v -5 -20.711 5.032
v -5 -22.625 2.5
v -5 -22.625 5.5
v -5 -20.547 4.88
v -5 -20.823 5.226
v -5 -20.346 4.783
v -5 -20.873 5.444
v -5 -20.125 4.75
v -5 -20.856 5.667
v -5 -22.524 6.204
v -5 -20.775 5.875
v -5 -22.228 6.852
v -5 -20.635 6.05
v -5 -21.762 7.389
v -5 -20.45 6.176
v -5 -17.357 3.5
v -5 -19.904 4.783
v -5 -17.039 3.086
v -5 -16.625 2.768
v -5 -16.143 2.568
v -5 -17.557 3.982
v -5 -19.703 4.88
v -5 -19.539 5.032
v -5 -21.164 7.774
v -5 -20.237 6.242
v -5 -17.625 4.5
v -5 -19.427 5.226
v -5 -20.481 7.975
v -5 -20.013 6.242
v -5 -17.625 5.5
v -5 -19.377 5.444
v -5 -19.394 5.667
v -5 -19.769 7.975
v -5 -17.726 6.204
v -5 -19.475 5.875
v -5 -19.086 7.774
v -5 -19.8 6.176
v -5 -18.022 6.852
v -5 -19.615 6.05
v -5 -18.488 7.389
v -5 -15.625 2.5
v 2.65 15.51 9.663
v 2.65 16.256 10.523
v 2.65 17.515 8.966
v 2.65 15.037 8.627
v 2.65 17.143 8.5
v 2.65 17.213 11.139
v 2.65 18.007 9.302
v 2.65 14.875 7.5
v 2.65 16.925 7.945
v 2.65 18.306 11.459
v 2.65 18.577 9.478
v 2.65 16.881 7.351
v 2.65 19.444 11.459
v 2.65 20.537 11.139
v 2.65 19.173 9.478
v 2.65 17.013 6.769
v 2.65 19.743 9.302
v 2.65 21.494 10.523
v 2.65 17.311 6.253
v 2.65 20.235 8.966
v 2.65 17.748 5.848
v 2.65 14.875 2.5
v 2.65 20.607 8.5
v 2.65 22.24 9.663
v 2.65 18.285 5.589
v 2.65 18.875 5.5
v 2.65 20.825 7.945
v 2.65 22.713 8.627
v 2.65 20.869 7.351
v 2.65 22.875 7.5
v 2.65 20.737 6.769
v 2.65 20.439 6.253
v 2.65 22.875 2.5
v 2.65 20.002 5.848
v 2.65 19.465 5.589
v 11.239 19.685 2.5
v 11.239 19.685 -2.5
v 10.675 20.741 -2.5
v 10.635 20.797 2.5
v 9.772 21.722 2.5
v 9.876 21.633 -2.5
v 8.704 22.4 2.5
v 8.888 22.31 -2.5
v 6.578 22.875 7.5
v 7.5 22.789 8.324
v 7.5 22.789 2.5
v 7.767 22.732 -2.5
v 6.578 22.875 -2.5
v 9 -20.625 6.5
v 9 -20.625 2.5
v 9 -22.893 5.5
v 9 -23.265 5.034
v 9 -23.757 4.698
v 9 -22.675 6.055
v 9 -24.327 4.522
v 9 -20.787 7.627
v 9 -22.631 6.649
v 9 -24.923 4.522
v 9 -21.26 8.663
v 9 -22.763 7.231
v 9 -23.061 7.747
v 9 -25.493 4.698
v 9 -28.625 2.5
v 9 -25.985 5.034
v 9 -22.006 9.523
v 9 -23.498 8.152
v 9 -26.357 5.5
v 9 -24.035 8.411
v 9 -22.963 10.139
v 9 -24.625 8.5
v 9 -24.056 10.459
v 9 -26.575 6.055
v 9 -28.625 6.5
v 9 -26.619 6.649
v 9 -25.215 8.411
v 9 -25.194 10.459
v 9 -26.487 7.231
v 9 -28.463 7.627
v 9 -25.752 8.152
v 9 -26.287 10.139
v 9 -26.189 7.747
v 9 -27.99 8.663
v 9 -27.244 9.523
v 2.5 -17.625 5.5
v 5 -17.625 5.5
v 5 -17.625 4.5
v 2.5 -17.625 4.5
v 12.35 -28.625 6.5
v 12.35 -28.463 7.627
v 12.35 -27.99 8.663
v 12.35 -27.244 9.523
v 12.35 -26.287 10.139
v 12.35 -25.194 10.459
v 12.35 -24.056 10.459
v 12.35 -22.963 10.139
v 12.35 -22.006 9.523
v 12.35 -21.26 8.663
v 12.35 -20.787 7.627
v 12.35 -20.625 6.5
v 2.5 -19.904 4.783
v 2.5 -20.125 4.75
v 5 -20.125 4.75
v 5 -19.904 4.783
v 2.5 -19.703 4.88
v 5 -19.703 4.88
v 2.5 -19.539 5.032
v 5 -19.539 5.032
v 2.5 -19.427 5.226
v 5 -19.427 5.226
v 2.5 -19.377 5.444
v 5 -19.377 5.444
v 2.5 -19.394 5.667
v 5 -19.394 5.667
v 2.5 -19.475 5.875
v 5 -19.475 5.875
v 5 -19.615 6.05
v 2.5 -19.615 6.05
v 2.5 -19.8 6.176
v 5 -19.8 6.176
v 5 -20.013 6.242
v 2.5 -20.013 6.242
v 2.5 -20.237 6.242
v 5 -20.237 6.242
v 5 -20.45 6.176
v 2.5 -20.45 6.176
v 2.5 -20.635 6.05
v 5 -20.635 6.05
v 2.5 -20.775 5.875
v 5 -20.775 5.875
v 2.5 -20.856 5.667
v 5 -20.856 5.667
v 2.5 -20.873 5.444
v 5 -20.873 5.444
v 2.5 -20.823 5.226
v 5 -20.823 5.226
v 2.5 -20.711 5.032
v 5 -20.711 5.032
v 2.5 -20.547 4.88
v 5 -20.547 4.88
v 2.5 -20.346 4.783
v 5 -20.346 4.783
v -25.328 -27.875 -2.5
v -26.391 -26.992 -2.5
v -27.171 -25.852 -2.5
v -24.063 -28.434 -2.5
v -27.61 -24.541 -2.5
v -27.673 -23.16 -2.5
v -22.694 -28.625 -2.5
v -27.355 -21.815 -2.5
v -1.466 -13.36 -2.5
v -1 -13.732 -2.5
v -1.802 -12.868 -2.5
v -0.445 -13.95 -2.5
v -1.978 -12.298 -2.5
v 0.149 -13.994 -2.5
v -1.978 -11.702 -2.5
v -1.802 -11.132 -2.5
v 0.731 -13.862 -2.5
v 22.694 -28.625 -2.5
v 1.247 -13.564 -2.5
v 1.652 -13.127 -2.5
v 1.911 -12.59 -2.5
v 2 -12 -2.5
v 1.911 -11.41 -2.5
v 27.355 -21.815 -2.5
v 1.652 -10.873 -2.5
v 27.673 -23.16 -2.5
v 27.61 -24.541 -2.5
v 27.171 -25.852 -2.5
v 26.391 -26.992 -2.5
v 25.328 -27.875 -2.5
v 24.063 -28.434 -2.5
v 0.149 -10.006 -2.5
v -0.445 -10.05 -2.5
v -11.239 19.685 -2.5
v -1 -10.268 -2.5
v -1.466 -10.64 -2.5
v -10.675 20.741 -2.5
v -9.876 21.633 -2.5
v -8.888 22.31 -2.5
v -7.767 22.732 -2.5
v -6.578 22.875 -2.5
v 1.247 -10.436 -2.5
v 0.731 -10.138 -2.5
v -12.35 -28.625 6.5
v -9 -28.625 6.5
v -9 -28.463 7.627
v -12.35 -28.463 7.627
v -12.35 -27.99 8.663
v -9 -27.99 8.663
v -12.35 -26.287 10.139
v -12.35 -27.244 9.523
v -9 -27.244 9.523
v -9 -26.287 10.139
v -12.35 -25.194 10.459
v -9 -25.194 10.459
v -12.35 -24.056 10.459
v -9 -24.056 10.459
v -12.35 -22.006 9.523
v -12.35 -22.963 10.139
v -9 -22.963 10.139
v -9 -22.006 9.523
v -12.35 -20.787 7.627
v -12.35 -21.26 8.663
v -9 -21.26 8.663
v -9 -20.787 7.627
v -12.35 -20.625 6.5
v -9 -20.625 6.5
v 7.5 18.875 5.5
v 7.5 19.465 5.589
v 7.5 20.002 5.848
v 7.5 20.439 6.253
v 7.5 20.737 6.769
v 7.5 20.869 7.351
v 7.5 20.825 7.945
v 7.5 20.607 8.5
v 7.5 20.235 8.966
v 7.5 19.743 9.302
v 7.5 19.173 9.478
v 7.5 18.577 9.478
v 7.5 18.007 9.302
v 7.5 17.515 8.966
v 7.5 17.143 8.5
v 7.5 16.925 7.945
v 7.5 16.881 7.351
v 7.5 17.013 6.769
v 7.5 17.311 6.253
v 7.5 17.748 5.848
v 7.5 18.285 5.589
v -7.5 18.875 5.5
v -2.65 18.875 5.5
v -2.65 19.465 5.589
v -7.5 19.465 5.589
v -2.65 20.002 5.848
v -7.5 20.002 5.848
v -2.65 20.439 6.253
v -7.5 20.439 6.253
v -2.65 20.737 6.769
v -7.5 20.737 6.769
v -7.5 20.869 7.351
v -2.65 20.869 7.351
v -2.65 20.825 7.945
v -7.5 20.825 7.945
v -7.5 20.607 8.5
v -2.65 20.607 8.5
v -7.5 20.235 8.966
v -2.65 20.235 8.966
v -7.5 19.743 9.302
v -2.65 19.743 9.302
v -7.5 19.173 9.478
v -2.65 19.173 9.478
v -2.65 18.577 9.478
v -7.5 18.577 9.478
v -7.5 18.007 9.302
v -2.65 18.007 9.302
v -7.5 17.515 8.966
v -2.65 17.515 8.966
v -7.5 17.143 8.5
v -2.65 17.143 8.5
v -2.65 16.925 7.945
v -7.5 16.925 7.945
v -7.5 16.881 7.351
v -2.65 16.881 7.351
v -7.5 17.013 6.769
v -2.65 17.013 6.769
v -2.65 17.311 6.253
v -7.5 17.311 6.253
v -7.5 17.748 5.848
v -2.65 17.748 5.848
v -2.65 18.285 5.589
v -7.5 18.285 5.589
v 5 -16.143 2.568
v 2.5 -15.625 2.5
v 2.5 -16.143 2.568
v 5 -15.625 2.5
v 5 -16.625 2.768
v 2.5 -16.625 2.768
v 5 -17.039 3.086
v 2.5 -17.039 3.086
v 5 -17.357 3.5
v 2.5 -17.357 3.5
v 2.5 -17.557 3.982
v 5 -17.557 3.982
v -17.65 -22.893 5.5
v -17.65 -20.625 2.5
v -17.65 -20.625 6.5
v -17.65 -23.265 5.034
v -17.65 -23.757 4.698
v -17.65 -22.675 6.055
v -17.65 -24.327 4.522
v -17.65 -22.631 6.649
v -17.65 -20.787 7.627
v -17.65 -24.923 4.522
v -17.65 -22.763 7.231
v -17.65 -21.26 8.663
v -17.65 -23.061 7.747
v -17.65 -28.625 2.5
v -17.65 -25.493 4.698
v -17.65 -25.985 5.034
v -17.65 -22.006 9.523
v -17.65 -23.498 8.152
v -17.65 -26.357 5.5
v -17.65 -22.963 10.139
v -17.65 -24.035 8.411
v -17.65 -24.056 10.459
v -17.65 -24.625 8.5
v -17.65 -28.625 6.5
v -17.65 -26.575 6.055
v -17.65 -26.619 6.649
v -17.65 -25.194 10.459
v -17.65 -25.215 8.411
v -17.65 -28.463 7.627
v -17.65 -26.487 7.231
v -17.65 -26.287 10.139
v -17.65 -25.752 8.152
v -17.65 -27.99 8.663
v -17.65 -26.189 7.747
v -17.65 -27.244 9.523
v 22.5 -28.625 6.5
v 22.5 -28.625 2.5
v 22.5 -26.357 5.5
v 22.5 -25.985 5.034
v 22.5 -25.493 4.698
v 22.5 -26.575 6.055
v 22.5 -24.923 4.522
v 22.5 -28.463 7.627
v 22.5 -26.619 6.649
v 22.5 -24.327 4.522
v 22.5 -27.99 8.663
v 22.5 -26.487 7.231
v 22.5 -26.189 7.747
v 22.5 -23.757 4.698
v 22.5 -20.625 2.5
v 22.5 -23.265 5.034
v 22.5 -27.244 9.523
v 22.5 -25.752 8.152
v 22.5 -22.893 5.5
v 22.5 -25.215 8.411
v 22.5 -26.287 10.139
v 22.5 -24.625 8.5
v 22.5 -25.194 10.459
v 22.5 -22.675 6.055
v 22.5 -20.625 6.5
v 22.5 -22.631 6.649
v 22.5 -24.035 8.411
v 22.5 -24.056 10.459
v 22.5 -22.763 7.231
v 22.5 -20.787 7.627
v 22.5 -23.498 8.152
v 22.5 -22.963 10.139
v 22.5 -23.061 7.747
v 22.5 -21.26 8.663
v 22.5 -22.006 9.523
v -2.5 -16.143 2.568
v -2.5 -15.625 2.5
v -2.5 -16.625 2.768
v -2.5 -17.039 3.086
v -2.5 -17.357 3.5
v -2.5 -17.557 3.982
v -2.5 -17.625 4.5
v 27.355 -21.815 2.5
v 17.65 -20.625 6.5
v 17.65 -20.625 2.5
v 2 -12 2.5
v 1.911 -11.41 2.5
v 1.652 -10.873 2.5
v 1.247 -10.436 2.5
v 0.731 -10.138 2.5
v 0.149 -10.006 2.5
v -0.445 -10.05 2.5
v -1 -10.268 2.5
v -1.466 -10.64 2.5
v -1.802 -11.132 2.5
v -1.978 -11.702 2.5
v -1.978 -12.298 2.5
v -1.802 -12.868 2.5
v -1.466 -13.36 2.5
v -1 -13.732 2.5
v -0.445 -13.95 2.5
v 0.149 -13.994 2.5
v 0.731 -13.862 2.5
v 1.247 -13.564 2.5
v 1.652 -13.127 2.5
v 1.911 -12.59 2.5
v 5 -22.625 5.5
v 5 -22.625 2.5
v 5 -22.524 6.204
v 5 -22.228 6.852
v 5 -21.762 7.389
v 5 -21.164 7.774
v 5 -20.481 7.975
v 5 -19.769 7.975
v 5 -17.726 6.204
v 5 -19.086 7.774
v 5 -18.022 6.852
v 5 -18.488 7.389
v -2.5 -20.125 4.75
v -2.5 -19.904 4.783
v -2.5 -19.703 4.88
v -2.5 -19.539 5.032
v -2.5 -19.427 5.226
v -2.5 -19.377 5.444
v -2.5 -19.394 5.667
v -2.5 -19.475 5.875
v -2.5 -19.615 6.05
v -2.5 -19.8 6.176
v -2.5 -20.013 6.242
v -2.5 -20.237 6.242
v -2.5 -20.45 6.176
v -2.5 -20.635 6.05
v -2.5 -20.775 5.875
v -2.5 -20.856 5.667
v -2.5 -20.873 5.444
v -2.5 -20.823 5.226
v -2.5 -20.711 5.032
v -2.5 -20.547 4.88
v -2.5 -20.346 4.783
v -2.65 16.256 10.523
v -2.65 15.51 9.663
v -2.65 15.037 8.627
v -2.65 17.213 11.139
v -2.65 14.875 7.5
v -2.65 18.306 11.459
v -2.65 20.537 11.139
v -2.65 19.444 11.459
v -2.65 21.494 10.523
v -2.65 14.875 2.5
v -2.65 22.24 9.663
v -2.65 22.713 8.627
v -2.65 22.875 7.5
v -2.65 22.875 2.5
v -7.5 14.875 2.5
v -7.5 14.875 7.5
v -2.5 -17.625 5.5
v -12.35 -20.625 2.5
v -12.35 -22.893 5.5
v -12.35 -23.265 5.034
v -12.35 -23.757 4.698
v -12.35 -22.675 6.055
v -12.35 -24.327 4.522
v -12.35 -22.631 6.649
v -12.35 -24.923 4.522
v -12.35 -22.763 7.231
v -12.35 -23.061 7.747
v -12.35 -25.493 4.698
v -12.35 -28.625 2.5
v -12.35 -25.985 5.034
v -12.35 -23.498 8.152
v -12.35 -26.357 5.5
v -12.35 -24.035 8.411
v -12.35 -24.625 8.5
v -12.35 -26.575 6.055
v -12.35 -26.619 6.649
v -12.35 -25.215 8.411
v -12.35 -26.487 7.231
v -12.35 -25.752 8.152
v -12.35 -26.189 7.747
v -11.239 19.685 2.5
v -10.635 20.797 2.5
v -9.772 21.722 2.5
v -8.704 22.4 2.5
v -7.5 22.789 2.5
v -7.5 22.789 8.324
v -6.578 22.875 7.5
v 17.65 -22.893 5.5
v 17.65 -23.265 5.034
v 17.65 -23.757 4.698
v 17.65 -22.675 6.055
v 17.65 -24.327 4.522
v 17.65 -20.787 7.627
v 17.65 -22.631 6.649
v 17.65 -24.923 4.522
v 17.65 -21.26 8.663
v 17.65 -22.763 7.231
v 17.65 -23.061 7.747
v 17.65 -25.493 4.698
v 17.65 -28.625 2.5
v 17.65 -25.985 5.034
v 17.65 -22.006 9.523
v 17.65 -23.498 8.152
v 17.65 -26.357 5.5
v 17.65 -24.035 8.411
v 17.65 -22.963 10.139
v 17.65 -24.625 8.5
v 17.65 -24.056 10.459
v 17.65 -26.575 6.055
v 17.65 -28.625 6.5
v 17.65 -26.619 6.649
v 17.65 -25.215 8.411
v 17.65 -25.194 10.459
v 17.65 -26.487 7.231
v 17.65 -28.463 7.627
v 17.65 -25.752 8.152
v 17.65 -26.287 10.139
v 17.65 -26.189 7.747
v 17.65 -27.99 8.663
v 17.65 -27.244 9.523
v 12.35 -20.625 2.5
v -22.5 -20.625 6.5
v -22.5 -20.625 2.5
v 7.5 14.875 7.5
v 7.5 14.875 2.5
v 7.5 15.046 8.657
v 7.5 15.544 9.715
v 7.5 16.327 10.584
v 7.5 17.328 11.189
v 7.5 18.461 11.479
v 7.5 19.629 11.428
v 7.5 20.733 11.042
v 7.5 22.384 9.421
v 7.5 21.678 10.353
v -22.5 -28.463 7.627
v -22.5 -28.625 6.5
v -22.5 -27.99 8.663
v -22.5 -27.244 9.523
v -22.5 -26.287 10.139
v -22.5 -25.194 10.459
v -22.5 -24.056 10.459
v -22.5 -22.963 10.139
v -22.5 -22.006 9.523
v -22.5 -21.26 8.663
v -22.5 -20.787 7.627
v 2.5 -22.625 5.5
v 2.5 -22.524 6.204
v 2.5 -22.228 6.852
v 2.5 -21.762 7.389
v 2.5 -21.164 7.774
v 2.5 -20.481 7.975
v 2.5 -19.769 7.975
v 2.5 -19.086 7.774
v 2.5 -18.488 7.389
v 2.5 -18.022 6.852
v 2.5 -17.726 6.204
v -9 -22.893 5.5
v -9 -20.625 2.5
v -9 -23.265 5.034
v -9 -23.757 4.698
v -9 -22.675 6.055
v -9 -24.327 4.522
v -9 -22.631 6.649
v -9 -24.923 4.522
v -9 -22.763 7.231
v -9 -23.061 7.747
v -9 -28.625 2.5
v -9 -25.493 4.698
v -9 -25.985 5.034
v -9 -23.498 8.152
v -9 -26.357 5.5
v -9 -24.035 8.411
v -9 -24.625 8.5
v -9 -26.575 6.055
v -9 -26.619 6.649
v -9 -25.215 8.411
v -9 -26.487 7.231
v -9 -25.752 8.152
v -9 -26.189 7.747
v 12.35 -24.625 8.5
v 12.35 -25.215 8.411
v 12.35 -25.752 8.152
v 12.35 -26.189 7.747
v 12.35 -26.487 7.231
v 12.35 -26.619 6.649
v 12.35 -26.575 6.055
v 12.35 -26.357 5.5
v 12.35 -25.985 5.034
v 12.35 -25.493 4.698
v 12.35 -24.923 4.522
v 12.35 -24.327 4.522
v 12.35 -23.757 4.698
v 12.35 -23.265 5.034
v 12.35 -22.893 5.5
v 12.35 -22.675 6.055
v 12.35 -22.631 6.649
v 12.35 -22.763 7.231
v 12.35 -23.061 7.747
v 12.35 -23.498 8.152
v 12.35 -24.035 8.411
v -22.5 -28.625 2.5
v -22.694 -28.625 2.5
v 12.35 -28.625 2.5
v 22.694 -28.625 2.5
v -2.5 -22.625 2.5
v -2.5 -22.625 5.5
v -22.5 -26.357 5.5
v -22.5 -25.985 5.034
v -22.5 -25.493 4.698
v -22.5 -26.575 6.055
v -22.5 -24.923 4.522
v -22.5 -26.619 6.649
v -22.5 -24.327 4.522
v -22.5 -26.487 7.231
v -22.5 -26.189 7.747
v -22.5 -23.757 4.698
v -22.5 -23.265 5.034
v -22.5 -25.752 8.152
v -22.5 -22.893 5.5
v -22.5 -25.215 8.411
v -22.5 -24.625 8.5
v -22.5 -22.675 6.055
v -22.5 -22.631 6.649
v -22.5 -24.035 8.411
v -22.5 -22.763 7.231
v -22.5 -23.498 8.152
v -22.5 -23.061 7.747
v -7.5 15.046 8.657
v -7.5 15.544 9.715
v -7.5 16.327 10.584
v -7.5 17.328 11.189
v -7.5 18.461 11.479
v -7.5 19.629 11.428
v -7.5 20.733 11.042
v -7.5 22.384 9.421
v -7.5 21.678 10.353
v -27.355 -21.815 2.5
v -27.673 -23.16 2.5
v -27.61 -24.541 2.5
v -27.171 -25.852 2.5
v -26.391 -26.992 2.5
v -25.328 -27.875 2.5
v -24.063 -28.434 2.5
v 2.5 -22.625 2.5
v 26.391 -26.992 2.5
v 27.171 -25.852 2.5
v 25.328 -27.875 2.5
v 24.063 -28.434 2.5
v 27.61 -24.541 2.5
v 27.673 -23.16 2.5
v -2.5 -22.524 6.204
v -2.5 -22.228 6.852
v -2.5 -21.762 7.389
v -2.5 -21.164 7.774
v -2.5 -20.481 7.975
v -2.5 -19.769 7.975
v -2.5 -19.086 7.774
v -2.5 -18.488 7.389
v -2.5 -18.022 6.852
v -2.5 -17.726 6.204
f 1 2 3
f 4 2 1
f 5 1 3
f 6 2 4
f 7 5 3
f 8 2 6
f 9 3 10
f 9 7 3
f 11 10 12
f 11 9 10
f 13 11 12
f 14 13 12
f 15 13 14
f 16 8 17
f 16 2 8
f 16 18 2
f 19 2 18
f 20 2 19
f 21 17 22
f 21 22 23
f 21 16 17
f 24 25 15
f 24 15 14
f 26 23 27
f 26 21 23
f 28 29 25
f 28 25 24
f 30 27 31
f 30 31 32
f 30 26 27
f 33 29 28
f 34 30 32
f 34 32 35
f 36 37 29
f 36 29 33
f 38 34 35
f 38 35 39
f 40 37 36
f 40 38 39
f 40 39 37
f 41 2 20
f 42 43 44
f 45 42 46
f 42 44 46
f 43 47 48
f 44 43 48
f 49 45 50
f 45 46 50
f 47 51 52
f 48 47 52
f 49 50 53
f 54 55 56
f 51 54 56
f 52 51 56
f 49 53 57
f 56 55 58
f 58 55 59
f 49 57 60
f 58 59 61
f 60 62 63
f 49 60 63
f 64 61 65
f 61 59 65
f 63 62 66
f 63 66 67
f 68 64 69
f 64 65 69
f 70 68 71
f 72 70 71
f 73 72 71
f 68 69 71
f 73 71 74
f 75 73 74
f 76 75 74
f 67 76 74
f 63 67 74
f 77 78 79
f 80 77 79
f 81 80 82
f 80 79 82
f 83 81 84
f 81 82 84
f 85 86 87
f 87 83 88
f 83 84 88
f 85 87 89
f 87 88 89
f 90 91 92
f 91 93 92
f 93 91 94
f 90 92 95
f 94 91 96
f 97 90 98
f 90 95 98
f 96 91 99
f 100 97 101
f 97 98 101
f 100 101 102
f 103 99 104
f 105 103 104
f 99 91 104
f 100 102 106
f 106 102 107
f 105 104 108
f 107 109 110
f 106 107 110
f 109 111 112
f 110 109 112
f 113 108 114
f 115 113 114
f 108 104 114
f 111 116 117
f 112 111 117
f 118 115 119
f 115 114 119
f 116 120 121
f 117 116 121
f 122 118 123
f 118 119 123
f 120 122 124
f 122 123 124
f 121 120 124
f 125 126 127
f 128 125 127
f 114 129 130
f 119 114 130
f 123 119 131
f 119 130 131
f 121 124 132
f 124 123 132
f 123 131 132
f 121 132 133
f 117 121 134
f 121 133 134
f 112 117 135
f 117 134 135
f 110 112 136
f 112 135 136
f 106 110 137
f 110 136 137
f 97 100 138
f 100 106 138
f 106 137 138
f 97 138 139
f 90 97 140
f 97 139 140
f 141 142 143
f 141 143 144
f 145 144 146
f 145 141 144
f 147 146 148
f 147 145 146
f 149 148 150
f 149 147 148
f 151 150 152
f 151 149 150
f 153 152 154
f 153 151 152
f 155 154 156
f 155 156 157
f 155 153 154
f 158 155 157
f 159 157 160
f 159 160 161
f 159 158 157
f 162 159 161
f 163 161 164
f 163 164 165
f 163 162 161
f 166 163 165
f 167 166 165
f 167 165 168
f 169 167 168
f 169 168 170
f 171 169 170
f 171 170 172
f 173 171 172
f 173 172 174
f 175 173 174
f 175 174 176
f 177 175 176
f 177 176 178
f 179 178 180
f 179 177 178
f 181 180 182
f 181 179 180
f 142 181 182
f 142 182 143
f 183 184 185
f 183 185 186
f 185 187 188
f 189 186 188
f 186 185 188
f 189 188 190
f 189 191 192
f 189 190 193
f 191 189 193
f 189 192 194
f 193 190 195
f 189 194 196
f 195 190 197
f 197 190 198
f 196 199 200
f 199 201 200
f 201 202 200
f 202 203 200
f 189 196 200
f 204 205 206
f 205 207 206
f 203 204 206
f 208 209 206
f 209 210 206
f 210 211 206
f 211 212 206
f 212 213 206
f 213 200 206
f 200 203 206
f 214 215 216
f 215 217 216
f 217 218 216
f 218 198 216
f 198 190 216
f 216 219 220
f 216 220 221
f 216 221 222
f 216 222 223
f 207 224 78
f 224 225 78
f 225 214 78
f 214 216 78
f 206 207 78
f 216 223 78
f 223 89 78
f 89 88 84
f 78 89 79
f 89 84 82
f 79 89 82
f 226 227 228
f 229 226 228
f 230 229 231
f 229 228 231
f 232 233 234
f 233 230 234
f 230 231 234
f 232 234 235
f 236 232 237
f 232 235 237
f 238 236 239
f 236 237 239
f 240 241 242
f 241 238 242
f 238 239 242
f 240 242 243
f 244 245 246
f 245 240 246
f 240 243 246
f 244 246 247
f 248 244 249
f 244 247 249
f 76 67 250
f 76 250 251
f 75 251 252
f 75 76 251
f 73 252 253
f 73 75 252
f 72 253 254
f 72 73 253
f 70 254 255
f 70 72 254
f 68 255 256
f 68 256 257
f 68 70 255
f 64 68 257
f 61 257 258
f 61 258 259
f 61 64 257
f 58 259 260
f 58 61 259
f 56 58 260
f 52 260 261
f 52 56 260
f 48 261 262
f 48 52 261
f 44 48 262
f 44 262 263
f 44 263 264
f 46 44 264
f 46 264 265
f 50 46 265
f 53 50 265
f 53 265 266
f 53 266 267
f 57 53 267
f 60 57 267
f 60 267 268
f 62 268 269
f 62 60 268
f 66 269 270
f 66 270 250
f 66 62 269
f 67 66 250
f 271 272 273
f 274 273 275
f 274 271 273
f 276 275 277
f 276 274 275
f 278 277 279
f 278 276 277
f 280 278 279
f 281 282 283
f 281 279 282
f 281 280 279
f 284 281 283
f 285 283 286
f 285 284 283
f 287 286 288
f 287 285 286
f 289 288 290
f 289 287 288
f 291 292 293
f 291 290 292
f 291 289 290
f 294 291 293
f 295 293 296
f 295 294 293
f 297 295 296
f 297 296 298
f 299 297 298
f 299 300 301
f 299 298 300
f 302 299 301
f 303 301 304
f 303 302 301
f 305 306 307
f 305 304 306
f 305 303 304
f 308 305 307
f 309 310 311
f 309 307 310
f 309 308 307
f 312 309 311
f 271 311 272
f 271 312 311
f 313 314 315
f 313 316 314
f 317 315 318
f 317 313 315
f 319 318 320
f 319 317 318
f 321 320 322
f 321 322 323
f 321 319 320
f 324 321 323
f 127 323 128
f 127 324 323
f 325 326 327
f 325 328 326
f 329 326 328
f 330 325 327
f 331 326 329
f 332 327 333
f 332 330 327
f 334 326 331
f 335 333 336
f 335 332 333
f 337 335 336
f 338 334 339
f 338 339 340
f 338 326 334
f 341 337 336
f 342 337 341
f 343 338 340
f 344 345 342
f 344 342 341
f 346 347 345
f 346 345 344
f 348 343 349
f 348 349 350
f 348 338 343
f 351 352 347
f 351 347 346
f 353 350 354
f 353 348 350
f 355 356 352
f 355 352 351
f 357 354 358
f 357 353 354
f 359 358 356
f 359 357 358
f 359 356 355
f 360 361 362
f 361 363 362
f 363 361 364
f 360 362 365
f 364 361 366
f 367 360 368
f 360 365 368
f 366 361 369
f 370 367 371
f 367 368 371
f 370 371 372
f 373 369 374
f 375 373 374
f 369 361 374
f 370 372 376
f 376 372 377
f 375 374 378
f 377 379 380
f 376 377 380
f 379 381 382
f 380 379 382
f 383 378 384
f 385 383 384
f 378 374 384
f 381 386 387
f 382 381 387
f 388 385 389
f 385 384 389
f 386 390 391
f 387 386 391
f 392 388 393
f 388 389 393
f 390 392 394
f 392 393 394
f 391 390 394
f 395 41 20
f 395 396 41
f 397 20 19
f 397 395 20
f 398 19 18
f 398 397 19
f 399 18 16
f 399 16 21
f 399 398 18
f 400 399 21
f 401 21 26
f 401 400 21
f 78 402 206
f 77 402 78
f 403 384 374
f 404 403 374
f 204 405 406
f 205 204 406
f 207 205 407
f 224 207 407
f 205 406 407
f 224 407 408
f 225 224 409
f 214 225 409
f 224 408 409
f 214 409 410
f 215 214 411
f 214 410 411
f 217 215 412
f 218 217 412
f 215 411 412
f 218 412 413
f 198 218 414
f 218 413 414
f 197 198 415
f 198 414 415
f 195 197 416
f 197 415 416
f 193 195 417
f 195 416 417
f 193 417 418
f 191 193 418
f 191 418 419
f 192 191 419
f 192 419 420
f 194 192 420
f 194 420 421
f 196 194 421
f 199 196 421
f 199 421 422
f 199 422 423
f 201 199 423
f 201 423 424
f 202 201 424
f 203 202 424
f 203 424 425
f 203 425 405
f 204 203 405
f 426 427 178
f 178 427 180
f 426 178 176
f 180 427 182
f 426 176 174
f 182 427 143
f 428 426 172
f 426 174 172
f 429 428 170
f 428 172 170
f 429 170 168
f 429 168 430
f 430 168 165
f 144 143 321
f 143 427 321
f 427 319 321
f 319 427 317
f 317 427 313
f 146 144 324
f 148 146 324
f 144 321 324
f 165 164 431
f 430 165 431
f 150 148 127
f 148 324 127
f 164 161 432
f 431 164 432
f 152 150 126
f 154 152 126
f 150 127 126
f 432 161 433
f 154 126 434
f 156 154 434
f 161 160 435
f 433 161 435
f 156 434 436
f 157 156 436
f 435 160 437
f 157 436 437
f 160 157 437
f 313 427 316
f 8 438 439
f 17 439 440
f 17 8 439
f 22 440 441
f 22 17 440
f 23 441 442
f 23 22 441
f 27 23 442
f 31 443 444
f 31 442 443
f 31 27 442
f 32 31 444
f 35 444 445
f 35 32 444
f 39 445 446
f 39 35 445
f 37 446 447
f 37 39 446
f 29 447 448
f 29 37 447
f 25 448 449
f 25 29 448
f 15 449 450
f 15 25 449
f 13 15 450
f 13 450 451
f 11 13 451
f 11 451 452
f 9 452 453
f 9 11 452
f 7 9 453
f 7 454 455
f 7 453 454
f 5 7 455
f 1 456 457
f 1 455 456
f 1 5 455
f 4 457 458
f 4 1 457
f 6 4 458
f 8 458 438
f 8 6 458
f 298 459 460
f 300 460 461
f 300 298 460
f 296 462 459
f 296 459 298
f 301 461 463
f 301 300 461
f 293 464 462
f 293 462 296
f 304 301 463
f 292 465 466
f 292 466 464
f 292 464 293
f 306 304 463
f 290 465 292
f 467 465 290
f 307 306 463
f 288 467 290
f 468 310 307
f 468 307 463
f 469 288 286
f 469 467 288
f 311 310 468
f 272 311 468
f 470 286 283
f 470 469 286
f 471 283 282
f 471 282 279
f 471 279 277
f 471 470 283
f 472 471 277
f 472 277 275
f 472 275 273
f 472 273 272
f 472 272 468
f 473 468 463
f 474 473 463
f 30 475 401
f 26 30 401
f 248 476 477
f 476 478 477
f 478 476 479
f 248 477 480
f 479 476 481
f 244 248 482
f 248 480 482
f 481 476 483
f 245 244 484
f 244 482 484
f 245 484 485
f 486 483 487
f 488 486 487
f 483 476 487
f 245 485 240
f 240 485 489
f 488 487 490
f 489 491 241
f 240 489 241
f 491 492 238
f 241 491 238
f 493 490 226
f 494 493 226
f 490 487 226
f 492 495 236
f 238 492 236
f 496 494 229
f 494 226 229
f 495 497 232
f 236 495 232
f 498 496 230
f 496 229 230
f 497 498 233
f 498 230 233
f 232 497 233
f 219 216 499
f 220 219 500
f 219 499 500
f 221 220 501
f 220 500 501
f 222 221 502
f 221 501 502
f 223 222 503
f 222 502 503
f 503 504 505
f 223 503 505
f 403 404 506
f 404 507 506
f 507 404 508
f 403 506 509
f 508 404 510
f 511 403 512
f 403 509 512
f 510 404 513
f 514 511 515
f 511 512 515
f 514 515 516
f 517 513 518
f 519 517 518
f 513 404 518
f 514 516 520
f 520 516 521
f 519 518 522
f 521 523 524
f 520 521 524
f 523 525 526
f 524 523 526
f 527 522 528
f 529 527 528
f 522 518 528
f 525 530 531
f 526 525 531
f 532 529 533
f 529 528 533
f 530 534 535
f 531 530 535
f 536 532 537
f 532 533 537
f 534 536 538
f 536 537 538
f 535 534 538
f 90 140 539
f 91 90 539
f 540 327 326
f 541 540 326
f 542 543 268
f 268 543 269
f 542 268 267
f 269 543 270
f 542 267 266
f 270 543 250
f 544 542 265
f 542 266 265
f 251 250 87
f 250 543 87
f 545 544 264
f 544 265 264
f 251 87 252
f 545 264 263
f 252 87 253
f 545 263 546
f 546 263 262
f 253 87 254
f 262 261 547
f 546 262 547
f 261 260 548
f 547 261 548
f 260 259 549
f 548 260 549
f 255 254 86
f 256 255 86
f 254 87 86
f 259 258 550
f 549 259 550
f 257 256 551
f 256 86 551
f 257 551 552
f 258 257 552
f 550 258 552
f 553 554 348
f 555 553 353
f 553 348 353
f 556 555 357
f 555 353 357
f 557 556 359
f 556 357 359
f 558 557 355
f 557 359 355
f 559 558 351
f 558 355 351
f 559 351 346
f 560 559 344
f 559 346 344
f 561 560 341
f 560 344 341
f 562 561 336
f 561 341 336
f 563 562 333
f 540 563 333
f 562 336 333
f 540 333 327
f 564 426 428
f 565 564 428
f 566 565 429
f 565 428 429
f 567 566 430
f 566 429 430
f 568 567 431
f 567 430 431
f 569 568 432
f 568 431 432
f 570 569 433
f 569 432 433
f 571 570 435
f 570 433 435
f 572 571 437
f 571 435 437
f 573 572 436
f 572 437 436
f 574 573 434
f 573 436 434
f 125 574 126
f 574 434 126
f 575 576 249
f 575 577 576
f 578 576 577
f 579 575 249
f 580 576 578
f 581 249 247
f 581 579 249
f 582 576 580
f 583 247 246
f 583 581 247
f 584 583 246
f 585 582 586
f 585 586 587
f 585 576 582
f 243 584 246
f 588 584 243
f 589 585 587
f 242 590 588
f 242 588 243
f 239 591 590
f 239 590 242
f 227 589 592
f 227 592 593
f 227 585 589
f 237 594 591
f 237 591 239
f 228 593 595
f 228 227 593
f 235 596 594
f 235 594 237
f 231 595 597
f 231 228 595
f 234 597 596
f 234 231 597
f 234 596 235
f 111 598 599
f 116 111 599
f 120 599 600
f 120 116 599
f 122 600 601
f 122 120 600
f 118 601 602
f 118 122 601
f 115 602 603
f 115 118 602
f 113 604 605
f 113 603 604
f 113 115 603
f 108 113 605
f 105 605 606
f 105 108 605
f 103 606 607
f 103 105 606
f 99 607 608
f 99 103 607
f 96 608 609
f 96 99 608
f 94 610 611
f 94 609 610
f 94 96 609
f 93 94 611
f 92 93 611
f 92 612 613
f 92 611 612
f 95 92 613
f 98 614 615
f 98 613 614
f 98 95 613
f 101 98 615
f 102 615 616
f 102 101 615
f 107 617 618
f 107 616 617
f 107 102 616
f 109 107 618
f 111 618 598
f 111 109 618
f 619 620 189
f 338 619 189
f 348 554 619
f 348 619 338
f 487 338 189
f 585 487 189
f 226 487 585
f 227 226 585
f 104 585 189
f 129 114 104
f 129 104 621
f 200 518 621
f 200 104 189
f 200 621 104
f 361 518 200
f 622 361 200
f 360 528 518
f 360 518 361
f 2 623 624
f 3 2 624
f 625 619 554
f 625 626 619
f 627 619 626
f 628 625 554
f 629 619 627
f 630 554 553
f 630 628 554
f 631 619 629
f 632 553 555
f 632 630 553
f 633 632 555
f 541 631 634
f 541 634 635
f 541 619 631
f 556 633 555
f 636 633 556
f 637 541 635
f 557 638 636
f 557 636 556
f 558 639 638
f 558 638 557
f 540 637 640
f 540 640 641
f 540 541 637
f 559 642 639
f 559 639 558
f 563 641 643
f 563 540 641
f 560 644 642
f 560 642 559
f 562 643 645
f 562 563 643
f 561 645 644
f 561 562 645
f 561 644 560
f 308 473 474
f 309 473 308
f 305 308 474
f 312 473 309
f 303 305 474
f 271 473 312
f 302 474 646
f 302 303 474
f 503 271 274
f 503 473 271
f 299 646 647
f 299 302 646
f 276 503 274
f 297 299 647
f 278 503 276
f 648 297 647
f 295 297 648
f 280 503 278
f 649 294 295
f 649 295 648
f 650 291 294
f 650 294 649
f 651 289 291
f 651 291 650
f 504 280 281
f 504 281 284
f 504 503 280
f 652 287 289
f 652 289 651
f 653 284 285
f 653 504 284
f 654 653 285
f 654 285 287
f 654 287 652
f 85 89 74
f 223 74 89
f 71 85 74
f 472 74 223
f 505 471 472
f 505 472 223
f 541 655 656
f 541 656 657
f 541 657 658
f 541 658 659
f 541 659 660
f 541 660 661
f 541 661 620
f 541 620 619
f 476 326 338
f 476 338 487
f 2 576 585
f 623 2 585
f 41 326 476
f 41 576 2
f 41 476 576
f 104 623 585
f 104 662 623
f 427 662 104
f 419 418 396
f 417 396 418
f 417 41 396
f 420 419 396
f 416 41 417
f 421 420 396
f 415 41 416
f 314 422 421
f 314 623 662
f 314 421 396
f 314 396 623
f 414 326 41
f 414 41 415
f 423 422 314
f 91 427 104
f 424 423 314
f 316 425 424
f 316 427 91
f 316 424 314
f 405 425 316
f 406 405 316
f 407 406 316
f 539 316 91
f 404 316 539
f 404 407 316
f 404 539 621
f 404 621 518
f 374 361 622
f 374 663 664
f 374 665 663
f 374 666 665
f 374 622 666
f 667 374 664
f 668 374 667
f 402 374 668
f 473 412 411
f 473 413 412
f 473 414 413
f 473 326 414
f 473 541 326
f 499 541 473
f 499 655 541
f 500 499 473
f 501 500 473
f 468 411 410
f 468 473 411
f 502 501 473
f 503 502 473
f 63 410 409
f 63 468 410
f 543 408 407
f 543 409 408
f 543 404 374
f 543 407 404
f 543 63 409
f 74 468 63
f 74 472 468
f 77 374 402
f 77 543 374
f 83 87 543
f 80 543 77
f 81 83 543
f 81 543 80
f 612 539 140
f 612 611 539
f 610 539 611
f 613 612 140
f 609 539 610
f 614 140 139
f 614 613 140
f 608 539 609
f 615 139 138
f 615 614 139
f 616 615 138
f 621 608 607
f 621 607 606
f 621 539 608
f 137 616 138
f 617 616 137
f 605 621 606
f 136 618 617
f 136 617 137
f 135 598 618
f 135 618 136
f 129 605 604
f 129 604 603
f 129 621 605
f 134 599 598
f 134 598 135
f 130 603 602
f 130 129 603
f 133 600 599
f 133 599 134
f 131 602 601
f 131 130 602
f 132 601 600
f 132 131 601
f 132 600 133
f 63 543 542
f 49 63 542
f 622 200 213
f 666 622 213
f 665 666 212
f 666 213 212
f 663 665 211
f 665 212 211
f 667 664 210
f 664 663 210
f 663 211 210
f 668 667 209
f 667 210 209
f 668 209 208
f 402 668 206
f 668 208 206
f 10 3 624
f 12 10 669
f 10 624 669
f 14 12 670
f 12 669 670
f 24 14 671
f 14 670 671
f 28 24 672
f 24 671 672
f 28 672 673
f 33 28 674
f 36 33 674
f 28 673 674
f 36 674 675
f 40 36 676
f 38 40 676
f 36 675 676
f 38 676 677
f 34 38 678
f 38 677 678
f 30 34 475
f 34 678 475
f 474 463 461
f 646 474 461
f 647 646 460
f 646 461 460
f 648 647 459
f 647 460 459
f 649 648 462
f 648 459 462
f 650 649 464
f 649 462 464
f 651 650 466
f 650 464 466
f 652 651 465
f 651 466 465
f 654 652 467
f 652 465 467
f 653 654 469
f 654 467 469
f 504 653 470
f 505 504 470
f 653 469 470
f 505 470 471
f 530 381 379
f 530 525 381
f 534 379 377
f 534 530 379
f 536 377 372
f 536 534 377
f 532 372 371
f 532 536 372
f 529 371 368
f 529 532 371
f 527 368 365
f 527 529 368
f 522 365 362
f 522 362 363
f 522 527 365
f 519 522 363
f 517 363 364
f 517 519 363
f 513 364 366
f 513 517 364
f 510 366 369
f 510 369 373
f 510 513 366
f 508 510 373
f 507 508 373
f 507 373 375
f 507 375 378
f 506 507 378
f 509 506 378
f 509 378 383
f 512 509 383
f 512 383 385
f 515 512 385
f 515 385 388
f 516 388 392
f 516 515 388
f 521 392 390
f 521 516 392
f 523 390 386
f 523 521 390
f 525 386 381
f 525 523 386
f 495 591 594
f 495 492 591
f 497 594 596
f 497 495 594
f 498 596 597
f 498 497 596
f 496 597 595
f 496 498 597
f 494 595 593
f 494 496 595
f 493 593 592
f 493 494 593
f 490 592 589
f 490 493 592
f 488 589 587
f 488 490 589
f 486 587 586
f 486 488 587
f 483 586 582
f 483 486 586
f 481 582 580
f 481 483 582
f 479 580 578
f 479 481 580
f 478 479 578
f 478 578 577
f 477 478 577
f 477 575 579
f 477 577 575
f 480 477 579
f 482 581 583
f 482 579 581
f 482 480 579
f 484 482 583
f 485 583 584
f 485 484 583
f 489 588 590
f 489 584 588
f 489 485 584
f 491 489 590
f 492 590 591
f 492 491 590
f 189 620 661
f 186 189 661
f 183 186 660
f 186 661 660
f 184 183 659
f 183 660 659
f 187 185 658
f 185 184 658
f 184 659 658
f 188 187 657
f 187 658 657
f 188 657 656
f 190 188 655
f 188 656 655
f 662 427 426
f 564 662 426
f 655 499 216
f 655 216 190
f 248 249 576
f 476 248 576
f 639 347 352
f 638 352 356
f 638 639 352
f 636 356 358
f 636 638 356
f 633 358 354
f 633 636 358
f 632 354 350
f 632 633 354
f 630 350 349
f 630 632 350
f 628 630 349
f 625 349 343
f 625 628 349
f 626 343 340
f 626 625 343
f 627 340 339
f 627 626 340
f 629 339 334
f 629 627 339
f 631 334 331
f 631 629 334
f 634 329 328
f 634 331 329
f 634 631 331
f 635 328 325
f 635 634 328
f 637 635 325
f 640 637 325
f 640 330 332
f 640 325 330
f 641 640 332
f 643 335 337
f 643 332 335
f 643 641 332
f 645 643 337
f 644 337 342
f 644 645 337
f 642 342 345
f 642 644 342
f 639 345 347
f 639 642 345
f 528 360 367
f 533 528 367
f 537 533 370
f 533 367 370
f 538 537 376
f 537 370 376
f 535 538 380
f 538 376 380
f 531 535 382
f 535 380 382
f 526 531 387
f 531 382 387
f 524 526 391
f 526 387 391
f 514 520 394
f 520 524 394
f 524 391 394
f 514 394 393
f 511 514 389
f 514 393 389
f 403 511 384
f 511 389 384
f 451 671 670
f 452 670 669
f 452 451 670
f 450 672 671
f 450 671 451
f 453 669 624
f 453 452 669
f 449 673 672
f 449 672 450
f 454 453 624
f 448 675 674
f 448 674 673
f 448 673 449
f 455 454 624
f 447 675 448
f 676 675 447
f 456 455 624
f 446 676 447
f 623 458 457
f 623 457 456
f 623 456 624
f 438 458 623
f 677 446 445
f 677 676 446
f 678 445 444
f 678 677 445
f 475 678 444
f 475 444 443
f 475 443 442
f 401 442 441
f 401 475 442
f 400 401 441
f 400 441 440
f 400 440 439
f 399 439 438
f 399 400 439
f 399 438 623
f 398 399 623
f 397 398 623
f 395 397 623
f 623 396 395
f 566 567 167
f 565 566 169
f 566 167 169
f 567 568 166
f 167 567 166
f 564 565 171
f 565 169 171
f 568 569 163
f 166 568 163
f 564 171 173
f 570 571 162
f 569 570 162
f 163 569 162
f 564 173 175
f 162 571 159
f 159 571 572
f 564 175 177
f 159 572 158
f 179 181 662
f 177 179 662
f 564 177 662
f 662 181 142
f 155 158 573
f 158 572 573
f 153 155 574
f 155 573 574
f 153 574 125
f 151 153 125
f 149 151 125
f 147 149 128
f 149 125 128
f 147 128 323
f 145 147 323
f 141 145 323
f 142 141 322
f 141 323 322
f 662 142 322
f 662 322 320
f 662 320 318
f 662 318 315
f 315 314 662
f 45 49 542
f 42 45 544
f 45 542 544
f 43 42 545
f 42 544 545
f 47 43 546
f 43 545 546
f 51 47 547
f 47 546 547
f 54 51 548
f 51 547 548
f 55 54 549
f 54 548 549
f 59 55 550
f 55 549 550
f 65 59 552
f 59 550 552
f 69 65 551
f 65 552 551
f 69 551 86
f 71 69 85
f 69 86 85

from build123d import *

# Parameters (mm, degrees)
BOSS_EXTRUDE1_DEPTH = 2.5
SKETCH2_R           = 2
BOSS_EXTRUDE2_DEPTH = 22.5
CUT_EXTRUDE1_REACH  = 62.519
SKETCH3_W           = 18
SKETCH3_H           = 16
SKETCH3_W_2         = 5.3
SKETCH7_R           = 2
BOSS_EXTRUDE4_DEPTH = 7.5
SKETCH8_W           = 5.3
SKETCH8_H           = 18
CUT_EXTRUDE4_DEPTH  = 8
SKETCH4_R           = 0.75
BOSS_EXTRUDE3_DEPTH = 5
SKETCH5_W           = 5
SKETCH5_H           = 11
CUT_EXTRUDE2_DEPTH  = 52.696228102
FILLET2_R           = 2
SKETCH6_R           = 2
CUT_EXTRUDE3_DEPTH  = 43.431010181
FILLET4_R           = 5


with BuildPart() as part:
    # Sketch1 → Boss-Extrude1 (new, symmetric)
    with BuildSketch(Plane.XY):
        Polygon((-30, -28.625), (30, -28.625), (10, 22.875), (-10, 22.875), align=None)
    extrude(amount=BOSS_EXTRUDE1_DEPTH, both=True)

    # Sketch2 → Boss-Extrude2 (add, symmetric)
    with BuildSketch(Plane(origin=(0, 0, 0), x_dir=(0, 0, -1), z_dir=(1, 0, 0))):
        with BuildLine():
            Line((-2.5, -28.625), (-6.5, -28.625))
            ThreePointArc((-6.5, -28.625), (-10.5, -24.625), (-6.5, -20.625))
            Line((-6.5, -20.625), (-2.5, -20.625))
            Line((-2.5, -20.625), (-2.5, -28.625))
        make_face()
        with Locations(Location((-6.5, -24.625, 0), (0, 0, 180))):
            Circle(SKETCH2_R, mode=Mode.SUBTRACT)
    extrude(amount=BOSS_EXTRUDE2_DEPTH, both=True)

    # Sketch3 → Cut-Extrude1 (cut, up to next)
    with BuildSketch(Plane.XZ.offset(28.625), mode=Mode.PRIVATE) as cut_extrude1_sk1:
        with Locations((0, 10.5)):
            Rectangle(SKETCH3_W, SKETCH3_H)
    cut_extrude1_tool1 = extrude(cut_extrude1_sk1.sketch, amount=-CUT_EXTRUDE1_REACH, mode=Mode.PRIVATE) & part.part
    # Sketch3 → Cut-Extrude1 (cut, up to next)
    with BuildSketch(Plane.XZ.offset(28.625), mode=Mode.PRIVATE) as cut_extrude1_sk2:
        with Locations((-15, 10.5)):
            Rectangle(SKETCH3_W_2, SKETCH3_H)
    cut_extrude1_tool2 = extrude(cut_extrude1_sk2.sketch, amount=-CUT_EXTRUDE1_REACH, mode=Mode.PRIVATE) & part.part
    cut_extrude1_1 = cut_extrude1_tool1.solids().sort_by_distance((0, -28.625, 10.5))[0]
    add(cut_extrude1_1, mode=Mode.SUBTRACT)
    cut_extrude1_2 = cut_extrude1_tool2.solids().sort_by_distance((-15, -28.625, 10.5))[0]
    add(cut_extrude1_2, mode=Mode.SUBTRACT)
    cut_extrude1 = cut_extrude1_1 + cut_extrude1_2  # Cut-Extrude1 as one shape, for the pattern or mirror that repeats it

    # Mirror2: Cut-Extrude1 across plane
    add(cut_extrude1.mirror(Plane(origin=(0, 0, 0), x_dir=(0, 0, 1), z_dir=(1, 0, 0))), mode=Mode.SUBTRACT)

    # Sketch7 → Boss-Extrude4 (add, symmetric)
    with BuildSketch(Plane(origin=(0, 0, 0), x_dir=(0, 0, -1), z_dir=(1, 0, 0))):
        with BuildLine():
            Line((-2.5, 14.875), (-7.5, 14.875))
            ThreePointArc((-7.5, 14.875), (-11.5, 18.875), (-7.5, 22.875))
            Line((-7.5, 22.875), (-2.5, 22.875))
            Line((-2.5, 22.875), (-2.5, 14.875))
        make_face()
        with Locations((-7.5, 18.875)):
            Circle(SKETCH7_R, mode=Mode.SUBTRACT)
    extrude(amount=BOSS_EXTRUDE4_DEPTH, both=True)

    # Sketch8 → Cut-Extrude4 (cut)
    with BuildSketch(Plane(origin=(0, 22.875, 0), x_dir=(1, 0, 0), z_dir=(0, 1, 0))):
        with Locations((0, -11.5)):
            Rectangle(SKETCH8_W, SKETCH8_H)
    extrude(amount=-CUT_EXTRUDE4_DEPTH, mode=Mode.SUBTRACT)

    # Sketch4 → Boss-Extrude3 (add, symmetric)
    with BuildSketch(Plane(origin=(0, 0, 0), x_dir=(0, 0, -1), z_dir=(1, 0, 0))):
        with BuildLine():
            Line((-2.5, -22.625), (-5.5, -22.625))
            ThreePointArc((-5.5, -22.625), (-8, -20.125), (-5.5, -17.625))
            Line((-5.5, -17.625), (-2.5, -17.625))
            Line((-2.5, -17.625), (-2.5, -22.625))
        make_face()
        with Locations((-5.5, -20.125)):
            Circle(SKETCH4_R, mode=Mode.SUBTRACT)
    extrude(amount=BOSS_EXTRUDE3_DEPTH, both=True)

    # Sketch5 → Cut-Extrude2 (cut, through all)
    with BuildSketch(Plane(origin=(0, -17.625, 0), x_dir=(1, 0, 0), z_dir=(0, 1, 0))):
        with Locations((0, -8)):
            Rectangle(SKETCH5_W, SKETCH5_H)
    extrude(amount=-CUT_EXTRUDE2_DEPTH, mode=Mode.SUBTRACT)

    # Fillet2
    fillet2_edges = [part.edges().sort_by_distance(p)[0] for p in [
        (3.75, -17.625, 2.5),
        (-3.75, -17.625, 2.5),
    ]]
    fillet(fillet2_edges, radius=FILLET2_R)

    # Sketch6 → Cut-Extrude3 (cut, through all)
    with BuildSketch(Plane.XY.offset(2.5)):
        with Locations((0, -12)):
            Circle(SKETCH6_R)
    extrude(amount=-CUT_EXTRUDE3_DEPTH, mode=Mode.SUBTRACT)

    # Fillet4
    # the kernel refuses this fillet: 5 mm, written as the material it takes off along each edge
    with BuildSketch(Plane(origin=(30, -28.625, -20.763876668), x_dir=(-1, 0, 0), z_dir=(0, 0, 1)), Plane(origin=(-30, -28.625, 20.763876668), x_dir=(1, 0, 0), z_dir=(0, 0, -1))) as fillet4_piece_1:
        with BuildLine():
            CenterArc((FILLET4_R * 1.46111013346, -FILLET4_R), FILLET4_R, 90, 111.223656503)
            Line((FILLET4_R * 0.52893572066, -FILLET4_R * 1.3620094807), (0, 0))
            Line((0, 0), (FILLET4_R * 1.46111013346, 0))
        make_face()
    extrude(amount=41.527753337, mode=Mode.SUBTRACT)
    with BuildSketch(Plane(origin=(10, 22.875, -11.055138804), x_dir=(0.3620094806999332, -0.9321744128023278, 0), z_dir=(0, 0, 1))) as fillet4_piece_2:
        with BuildLine():
            CenterArc((FILLET4_R * 0.684411104336, -FILLET4_R), FILLET4_R, 90, 68.776343497)
            Line((-FILLET4_R * 0.247763308466, -FILLET4_R * 0.6379905193), (0, 0))
            Line((0, 0), (FILLET4_R * 0.684411104336, 0))
        make_face()
    extrude(amount=22.110277608, mode=Mode.SUBTRACT)
    with BuildSketch(Plane(origin=(-10, 22.875, 11.055138804), x_dir=(1, 0, 0), z_dir=(0, 0, -1))) as fillet4_piece_3:
        with BuildLine():
            CenterArc((FILLET4_R * 0.684411104336, FILLET4_R), FILLET4_R, 201.223656503, 68.776343497)
            Line((-FILLET4_R * 0.247763308466, FILLET4_R * 0.6379905193), (0, 0))
            Line((0, 0), (FILLET4_R * 0.684411104336, 0))
        make_face()
    extrude(amount=22.110277608, mode=Mode.SUBTRACT)


solid = part.part
